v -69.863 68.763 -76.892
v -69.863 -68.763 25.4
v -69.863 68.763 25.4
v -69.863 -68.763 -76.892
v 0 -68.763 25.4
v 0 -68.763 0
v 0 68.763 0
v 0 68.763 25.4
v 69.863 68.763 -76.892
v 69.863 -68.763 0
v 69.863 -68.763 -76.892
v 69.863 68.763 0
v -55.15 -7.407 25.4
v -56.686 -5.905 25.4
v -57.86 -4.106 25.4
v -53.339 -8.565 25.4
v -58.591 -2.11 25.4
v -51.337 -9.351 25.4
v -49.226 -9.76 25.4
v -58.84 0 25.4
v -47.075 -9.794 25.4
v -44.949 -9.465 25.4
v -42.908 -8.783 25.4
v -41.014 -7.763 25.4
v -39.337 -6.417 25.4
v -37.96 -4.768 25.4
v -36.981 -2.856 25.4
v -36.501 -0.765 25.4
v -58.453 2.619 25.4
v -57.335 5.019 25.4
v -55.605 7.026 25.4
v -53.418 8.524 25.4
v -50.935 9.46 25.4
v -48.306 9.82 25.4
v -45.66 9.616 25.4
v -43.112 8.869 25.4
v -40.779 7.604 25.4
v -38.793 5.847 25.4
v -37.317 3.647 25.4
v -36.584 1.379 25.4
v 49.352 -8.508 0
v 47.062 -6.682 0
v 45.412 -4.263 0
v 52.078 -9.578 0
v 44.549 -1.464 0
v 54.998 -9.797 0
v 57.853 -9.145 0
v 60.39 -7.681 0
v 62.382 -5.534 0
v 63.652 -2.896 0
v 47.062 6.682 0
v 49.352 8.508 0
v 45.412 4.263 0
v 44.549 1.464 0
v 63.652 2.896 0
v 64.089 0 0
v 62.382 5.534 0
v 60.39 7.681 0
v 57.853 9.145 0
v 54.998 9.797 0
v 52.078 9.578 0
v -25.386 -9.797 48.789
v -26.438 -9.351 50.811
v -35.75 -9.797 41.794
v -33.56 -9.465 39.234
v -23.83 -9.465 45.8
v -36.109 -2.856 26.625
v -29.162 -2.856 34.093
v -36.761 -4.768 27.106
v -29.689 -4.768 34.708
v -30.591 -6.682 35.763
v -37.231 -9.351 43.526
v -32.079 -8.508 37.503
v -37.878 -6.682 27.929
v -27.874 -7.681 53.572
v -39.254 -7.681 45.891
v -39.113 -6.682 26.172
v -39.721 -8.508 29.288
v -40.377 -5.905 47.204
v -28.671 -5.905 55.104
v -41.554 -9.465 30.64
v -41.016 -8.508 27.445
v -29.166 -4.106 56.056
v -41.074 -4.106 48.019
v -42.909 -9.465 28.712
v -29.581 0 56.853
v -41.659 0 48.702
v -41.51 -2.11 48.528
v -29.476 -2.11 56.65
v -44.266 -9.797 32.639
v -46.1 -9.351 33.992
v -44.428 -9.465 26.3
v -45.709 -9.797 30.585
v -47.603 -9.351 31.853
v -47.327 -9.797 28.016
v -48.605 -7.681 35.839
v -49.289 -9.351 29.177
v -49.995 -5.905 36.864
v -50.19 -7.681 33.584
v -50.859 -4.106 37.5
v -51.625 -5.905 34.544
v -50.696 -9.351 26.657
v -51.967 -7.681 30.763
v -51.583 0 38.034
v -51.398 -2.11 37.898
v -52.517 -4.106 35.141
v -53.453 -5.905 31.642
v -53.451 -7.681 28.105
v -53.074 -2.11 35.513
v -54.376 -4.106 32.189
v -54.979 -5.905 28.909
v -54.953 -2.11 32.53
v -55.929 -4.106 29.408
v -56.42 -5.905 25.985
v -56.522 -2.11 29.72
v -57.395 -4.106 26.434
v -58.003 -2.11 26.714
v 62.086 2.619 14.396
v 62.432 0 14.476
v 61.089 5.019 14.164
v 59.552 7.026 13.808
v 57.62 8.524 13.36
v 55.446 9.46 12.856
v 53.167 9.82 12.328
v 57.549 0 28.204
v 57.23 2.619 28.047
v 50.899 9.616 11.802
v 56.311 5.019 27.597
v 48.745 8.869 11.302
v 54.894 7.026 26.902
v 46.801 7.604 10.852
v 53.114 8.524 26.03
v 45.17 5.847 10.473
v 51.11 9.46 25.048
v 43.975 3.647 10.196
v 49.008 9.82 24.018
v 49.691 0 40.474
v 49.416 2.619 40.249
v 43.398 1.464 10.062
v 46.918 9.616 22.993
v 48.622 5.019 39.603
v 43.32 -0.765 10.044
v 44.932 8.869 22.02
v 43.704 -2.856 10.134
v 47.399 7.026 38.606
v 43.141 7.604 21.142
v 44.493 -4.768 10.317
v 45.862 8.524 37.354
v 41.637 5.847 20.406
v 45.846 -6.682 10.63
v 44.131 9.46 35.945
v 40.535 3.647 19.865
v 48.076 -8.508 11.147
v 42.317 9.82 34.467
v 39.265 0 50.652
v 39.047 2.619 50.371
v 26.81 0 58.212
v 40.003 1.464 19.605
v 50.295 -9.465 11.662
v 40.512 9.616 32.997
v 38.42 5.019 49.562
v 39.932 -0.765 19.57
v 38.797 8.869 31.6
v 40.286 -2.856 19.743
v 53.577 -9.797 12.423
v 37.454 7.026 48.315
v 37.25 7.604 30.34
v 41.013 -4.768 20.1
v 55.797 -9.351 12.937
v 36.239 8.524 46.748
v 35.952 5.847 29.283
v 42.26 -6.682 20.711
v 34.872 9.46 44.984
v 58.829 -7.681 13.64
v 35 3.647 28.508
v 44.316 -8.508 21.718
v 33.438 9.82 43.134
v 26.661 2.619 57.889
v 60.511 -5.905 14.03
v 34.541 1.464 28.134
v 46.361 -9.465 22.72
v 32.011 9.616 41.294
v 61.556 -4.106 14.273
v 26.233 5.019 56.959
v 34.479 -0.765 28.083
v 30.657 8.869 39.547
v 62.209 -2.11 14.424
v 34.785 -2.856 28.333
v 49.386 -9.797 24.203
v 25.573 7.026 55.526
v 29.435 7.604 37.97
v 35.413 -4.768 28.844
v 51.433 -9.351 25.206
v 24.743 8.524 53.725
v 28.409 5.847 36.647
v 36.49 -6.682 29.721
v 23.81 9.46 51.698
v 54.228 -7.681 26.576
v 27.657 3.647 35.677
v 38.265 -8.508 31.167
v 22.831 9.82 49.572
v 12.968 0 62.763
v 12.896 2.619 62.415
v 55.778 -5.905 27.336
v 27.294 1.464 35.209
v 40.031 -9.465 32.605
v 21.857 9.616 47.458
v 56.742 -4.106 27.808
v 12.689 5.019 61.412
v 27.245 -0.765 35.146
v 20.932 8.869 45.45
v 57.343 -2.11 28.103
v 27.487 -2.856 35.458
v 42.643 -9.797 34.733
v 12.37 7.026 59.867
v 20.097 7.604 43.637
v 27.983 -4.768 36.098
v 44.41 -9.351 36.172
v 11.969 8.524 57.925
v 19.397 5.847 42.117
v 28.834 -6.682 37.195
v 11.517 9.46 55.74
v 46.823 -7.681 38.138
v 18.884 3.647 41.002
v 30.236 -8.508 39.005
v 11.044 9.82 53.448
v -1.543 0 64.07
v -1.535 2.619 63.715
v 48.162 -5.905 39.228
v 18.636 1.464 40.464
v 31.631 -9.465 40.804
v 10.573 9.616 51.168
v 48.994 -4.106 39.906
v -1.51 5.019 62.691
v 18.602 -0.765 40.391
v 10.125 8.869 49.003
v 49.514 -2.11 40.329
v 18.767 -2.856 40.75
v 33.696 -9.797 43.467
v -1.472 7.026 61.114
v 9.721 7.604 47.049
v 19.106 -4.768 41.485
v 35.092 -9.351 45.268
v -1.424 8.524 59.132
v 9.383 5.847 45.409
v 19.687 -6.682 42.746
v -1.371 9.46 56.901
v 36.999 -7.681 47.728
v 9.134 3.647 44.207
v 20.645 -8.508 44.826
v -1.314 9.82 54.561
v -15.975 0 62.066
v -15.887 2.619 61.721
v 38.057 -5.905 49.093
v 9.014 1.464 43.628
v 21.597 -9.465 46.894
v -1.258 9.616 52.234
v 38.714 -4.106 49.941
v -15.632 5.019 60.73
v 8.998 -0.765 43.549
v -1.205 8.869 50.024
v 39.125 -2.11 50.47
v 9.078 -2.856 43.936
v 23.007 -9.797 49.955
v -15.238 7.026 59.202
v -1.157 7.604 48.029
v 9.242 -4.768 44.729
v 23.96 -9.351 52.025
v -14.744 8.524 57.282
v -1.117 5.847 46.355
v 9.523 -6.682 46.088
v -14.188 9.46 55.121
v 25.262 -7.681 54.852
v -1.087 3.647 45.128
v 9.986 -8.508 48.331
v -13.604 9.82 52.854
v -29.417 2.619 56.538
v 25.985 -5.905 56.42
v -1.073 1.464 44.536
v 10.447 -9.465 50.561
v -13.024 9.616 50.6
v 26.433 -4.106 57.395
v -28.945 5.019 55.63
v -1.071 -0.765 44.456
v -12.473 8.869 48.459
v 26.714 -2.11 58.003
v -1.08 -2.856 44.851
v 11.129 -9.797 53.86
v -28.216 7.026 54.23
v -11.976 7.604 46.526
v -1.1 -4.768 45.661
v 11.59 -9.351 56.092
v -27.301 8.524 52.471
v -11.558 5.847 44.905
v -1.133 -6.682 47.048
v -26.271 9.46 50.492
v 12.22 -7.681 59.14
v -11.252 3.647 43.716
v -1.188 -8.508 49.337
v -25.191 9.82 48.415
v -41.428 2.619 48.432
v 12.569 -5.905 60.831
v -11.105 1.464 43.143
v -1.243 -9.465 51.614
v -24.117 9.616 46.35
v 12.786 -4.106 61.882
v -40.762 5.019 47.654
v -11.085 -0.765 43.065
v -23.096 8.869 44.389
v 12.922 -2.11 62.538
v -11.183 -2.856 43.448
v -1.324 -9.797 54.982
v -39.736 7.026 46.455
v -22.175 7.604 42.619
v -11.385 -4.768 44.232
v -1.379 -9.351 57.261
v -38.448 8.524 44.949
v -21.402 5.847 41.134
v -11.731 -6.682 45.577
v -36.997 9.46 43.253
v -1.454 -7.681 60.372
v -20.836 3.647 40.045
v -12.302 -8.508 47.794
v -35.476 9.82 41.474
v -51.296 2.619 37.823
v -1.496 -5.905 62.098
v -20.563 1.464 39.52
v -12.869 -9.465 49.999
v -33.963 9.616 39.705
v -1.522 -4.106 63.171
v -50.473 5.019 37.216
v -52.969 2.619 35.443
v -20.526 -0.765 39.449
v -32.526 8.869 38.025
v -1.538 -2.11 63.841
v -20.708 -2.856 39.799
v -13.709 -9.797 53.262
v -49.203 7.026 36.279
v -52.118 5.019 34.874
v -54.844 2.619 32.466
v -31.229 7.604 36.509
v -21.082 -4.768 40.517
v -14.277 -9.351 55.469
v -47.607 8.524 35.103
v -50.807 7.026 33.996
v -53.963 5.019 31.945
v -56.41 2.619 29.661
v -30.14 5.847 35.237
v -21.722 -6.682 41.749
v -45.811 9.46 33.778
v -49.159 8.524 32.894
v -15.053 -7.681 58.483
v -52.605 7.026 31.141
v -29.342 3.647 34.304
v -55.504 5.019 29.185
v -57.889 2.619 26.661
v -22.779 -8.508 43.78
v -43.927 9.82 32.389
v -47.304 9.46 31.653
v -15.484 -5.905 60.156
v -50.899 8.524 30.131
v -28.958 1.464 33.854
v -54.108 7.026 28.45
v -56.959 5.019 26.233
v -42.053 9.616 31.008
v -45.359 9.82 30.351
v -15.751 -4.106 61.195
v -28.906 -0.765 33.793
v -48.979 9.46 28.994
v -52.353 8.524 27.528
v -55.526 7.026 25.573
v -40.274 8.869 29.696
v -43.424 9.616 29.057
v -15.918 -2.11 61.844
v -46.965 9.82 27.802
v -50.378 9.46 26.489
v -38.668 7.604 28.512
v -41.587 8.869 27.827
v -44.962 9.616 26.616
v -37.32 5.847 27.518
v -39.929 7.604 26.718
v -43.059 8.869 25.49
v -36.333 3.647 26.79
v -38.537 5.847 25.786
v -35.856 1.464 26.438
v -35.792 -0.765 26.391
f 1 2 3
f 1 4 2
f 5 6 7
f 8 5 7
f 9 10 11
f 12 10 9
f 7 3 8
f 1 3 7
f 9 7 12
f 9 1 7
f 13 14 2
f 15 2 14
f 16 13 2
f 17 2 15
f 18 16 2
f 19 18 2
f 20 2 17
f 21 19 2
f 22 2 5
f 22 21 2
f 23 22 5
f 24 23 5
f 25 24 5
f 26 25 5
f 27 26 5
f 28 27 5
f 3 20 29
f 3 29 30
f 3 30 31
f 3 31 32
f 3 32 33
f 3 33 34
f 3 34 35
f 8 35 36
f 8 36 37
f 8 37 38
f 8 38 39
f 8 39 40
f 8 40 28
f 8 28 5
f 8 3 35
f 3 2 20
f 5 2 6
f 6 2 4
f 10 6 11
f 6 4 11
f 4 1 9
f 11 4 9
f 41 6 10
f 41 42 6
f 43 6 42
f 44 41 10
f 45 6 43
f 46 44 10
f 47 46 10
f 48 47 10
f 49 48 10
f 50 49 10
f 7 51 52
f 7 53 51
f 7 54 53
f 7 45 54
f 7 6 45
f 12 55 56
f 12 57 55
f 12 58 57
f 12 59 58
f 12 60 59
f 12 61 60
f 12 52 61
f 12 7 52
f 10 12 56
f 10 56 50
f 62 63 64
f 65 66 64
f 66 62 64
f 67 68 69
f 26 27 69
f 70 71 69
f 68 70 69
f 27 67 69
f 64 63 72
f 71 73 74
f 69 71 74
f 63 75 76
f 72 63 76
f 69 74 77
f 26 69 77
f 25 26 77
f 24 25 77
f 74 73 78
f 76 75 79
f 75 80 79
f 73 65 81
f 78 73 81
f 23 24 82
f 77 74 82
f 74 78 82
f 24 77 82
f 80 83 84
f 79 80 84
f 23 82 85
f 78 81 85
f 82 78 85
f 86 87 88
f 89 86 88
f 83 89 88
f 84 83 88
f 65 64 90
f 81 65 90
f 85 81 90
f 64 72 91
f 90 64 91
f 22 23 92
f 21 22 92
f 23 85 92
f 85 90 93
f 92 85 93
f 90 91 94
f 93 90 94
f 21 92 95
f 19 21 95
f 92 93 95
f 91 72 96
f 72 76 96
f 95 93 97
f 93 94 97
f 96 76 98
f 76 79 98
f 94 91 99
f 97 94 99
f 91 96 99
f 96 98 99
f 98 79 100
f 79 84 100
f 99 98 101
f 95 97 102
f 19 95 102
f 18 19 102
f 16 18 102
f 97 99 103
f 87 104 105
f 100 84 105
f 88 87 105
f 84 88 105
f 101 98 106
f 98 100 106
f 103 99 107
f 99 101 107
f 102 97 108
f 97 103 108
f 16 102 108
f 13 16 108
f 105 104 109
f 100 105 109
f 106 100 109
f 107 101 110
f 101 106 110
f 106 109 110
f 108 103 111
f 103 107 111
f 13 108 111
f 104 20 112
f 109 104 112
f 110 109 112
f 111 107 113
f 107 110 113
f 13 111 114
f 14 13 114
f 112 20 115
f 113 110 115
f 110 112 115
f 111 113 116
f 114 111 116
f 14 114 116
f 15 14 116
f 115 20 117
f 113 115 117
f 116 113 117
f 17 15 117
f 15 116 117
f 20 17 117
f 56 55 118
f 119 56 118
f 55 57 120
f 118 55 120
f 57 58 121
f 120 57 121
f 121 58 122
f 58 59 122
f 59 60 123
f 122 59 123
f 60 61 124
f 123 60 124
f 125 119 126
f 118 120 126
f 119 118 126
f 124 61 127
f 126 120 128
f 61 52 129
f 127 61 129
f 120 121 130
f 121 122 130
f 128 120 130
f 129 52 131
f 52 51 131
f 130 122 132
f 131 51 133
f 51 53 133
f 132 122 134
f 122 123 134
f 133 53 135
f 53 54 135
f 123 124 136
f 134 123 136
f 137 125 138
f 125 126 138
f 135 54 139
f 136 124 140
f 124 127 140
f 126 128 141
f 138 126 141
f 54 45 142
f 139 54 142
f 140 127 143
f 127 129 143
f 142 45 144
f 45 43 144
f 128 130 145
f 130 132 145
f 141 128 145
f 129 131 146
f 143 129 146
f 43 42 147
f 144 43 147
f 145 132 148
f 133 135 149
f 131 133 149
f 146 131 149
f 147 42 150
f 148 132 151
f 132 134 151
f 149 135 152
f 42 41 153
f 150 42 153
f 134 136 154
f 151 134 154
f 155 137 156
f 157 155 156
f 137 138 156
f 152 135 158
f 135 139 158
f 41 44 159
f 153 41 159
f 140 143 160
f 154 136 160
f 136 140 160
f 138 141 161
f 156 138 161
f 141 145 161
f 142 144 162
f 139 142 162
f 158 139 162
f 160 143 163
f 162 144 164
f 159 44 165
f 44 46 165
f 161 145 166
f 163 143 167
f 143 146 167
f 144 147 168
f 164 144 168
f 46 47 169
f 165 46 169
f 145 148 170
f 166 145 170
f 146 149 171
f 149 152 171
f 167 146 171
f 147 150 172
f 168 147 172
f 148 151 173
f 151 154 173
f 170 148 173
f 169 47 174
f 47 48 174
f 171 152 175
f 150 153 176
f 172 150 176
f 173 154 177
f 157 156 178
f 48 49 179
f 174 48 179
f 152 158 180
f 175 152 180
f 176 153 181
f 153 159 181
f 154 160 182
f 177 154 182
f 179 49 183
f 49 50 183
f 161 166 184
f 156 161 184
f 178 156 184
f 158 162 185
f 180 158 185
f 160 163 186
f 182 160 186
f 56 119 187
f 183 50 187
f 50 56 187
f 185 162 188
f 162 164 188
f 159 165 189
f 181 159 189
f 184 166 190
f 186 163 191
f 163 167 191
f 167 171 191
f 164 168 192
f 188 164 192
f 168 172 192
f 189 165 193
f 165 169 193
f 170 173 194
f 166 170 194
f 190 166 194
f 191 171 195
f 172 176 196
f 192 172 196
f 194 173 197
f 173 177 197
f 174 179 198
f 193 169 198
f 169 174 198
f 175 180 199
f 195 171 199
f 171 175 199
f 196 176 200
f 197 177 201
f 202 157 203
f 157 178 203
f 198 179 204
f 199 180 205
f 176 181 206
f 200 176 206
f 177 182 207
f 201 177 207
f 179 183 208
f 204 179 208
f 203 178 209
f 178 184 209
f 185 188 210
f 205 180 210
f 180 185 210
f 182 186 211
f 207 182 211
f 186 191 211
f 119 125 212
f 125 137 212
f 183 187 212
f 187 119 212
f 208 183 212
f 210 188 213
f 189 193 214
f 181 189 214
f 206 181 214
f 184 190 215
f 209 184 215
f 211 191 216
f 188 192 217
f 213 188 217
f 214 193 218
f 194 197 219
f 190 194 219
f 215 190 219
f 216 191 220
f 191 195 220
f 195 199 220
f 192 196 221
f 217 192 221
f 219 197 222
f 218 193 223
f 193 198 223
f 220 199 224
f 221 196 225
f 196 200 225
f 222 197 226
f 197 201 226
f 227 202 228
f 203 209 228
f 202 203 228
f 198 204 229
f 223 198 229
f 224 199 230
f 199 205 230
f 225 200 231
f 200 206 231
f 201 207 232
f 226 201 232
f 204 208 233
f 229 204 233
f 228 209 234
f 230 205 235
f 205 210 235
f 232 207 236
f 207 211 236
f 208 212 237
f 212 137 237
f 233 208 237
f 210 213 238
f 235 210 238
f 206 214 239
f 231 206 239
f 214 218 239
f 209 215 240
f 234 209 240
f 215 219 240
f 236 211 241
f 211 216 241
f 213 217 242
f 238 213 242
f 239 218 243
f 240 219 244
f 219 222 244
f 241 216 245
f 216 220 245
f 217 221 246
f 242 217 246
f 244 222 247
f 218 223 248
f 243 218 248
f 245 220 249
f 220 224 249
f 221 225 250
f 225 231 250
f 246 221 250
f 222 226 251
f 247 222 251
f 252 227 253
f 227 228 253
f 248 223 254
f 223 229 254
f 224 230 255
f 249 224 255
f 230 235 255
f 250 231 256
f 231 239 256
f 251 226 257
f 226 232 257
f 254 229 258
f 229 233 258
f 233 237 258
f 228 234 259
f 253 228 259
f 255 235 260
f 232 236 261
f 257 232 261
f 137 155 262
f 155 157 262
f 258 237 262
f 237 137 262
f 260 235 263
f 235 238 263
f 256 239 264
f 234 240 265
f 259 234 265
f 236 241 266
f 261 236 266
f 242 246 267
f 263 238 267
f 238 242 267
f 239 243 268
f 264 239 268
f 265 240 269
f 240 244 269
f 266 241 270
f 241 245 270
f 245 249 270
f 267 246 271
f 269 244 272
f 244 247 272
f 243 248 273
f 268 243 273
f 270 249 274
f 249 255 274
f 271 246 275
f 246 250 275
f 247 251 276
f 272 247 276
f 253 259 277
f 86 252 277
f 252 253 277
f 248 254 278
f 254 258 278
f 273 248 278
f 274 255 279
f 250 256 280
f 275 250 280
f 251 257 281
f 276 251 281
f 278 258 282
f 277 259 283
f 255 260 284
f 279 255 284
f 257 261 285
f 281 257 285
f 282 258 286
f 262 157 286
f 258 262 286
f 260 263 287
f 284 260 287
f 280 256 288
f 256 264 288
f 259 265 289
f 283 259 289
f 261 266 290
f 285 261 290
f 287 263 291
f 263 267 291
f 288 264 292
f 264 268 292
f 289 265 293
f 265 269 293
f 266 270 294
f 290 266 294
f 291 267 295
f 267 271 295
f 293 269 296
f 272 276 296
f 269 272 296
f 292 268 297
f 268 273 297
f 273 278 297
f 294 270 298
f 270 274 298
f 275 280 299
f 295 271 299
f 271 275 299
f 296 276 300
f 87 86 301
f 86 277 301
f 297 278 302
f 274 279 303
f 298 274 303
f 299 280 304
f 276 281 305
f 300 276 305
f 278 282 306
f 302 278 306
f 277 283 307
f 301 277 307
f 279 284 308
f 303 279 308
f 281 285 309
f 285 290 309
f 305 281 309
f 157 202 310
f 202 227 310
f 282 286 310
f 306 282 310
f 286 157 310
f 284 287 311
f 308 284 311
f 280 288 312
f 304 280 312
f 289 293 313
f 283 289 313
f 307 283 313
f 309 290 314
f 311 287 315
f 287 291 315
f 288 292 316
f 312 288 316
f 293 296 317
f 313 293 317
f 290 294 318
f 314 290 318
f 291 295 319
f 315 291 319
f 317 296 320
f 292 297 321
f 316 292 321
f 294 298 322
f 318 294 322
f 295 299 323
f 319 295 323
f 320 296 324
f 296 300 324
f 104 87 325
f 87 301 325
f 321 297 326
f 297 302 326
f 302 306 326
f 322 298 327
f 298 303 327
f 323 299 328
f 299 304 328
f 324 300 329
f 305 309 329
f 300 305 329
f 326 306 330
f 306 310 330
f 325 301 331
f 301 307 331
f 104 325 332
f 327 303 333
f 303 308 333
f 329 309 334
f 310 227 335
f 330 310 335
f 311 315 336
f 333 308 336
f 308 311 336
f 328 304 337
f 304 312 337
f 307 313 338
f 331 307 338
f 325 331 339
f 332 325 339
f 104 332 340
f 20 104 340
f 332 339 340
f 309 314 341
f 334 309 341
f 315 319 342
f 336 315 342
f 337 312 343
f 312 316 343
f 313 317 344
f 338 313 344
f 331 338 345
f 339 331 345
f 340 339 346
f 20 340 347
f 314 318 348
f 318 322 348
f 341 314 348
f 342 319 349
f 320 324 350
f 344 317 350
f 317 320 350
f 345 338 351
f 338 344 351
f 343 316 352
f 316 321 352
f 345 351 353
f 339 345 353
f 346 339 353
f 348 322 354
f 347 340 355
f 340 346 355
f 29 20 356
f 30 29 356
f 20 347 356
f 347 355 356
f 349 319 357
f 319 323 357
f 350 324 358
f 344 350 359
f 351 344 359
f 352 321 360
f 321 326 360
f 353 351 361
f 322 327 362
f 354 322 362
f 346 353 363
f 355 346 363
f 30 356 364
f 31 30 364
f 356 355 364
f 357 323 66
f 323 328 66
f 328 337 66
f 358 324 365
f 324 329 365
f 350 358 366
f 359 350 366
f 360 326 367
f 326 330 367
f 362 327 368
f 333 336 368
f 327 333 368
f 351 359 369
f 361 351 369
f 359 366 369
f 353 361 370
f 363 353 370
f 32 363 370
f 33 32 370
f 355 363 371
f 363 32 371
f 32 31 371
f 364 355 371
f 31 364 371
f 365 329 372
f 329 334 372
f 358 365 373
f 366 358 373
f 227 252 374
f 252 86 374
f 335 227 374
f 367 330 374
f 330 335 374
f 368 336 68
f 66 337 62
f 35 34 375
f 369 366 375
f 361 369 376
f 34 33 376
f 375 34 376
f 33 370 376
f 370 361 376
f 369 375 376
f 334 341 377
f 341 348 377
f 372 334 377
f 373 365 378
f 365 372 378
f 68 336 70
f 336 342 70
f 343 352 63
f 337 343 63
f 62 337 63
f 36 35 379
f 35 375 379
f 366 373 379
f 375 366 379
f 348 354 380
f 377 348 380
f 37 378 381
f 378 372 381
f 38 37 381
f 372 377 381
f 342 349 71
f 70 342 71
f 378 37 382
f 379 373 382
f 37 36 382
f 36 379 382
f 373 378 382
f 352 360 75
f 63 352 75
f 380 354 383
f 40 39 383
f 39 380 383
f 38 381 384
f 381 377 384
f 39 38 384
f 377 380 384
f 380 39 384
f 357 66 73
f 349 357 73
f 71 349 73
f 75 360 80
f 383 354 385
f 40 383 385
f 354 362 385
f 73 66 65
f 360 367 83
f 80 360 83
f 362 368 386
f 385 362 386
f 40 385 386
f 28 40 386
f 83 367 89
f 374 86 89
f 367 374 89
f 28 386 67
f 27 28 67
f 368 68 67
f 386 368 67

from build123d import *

# Parameters (mm, degrees)
F0_W      = 69.863096
F0_H      = 137.526572
F2_DEPTH  = 76.89179
F1_R      = 9.824635
F4_DEPTH  = 25.4
F4_FACE_W = 69.863096
F4_FACE_H = 137.526572
F5_DEPTH  = 25.4
F6_DEPTH  = 25.4


with BuildPart() as f2:
    # F0 (on Top) → F2 (new body)
    with BuildSketch(Plane.XY):
        with Locations((-34.931548, 0)):
            Rectangle(F0_W, F0_H)
        with Locations((34.931548, 0)):
            Rectangle(F0_W, F0_H)
    extrude(amount=-F2_DEPTH)

    # F1 (on Top) → F3 (revolve)
    with BuildSketch(Plane.XY):
        with Locations((54.264009, 0)):
            Circle(F1_R)
    revolve(axis=Axis((0, 0, 0), (0, -1, 0)))

    # F0 (on Top) → F4 (join)
    with BuildSketch(Plane.XY):
        with Locations((-34.931548, 0)):
            Rectangle(F0_W, F0_H)
    extrude(amount=F4_DEPTH)

    # F4_face (on face) → F5 (join)
    with BuildSketch(Plane(origin=(-34.455236, 0, 25.4), x_dir=(1, 0, 0), z_dir=(0, 0, 1))):
        with Locations((-0.476312, 0)):
            Rectangle(F4_FACE_W, F4_FACE_H)
        with BuildLine():
            add(Edge.make_bspline(
                [(-24.385178, 0), (-24.385178, 0.668247), (-24.32577, 1.336628), (-24.206912, 1.99823), (-24.030098, 2.646689), (-23.797825, 3.276099), (-23.37971, 4.166697), (-23.234065, 4.446908), (-23.077242, 4.721166), (-22.909651, 4.98898), (-22.731734, 5.249905), (-22.229971, 5.927648), (-21.88841, 6.331385), (-21.521456, 6.712873), (-21.131426, 7.070663), (-20.720671, 7.403639), (-19.847998, 8.028648), (-19.384812, 8.318937), (-18.904547, 8.580964), (-18.409705, 8.814186), (-17.902695, 9.018322), (-17.050434, 9.306791), (-16.710914, 9.40802), (-16.367843, 9.496945), (-16.02182, 9.573576), (-15.673419, 9.637946), (-14.585966, 9.79991), (-13.840719, 9.855608), (-13.09247, 9.857734), (-12.345999, 9.807078), (-11.605852, 9.704627), (-10.339404, 9.438416), (-9.80827, 9.297984), (-9.284679, 9.130358), (-8.770428, 8.935906), (-8.267378, 8.715014), (-7.592089, 8.374585), (-7.408591, 8.277395), (-7.227085, 8.176494), (-7.047683, 8.071901), (-6.870499, 7.963641), (-6.45624, 7.69851), (-6.221211, 7.538453), (-5.990868, 7.371624), (-5.765532, 7.198092), (-5.545543, 7.017935), (-5.03891, 6.576543), (-4.757184, 6.309683), (-4.486982, 6.030895), (-4.229294, 5.740472), (-3.985174, 5.4388), (-3.558839, 4.858328), (-3.372758, 4.582367), (-3.198165, 4.298826), (-3.035779, 4.008107), (-2.886315, 3.710707), (-2.67324, 3.234777), (-2.600421, 3.060357), (-2.532119, 2.88409), (-2.468453, 2.706097), (-2.409533, 2.526514), (-2.243048, 1.969131), (-2.15158, 1.586498), (-2.081997, 1.19897), (-2.03498, 0.808045), (-2.01092, 0.415339), (-2.008697, -0.377657), (-2.031422, -0.778015), (-2.078012, -1.17662), (-2.148069, -1.571759), (-2.240876, -1.961843), (-2.409505, -2.526425), (-2.46842, -2.706002), (-2.532082, -2.883988), (-2.600379, -3.060249), (-2.673192, -3.234663), (-2.88625, -3.710575), (-3.035702, -4.007963), (-3.198075, -4.298671), (-3.372655, -4.582202), (-3.55872, -4.858153), (-3.985022, -5.438608), (-4.229123, -5.740271), (-4.486791, -6.030687), (-4.756973, -6.30947), (-5.038678, -6.576325), (-5.545277, -7.017715), (-5.765253, -7.197872), (-5.990575, -7.371405), (-6.220906, -7.538235), (-6.455921, -7.698295), (-6.87016, -7.963432), (-7.047336, -8.071696), (-7.226731, -8.176292), (-7.40823, -8.277198), (-7.591721, -8.374391), (-8.266995, -8.714841), (-8.770037, -8.93575), (-9.284281, -9.130219), (-9.807866, -9.297862), (-10.338996, -9.438312), (-11.605451, -9.704568), (-12.345612, -9.807044), (-13.092098, -9.857724), (-13.840364, -9.85562), (-14.58563, -9.799941), (-15.673115, -9.638001), (-16.021528, -9.573637), (-16.367564, -9.497013), (-16.710646, -9.408093), (-17.050179, -9.306869), (-17.902472, -9.018411), (-18.4095, -8.814279), (-18.90436, -8.58106), (-19.384645, -8.319034), (-19.847849, -8.028745), (-20.720553, -7.403734), (-21.131321, -7.070757), (-21.521364, -6.712964), (-21.888331, -6.331472), (-22.229903, -5.927731), (-22.731682, -5.249979), (-22.909604, -4.989052), (-23.0772, -4.721236), (-23.234028, -4.446976), (-23.379677, -4.166762), (-23.797805, -3.276152), (-24.030086, -2.646733), (-24.206906, -1.998264), (-24.325768, -1.336651), (-24.385178, -0.668258), (-24.385178, 0)],
                knots=[0, 0, 0, 0, 0, 0, 0, 0.060752, 0.060752, 0.060752, 0.060752, 0.060752, 0.089435, 0.089435, 0.089435, 0.089435, 0.089435, 0.137395, 0.137395, 0.137395, 0.137395, 0.137395, 0.186967, 0.186967, 0.186967, 0.186967, 0.186967, 0.219128, 0.219128, 0.219128, 0.219128, 0.219128, 0.286825, 0.286825, 0.286825, 0.286825, 0.286825, 0.336655, 0.336655, 0.336655, 0.336655, 0.336655, 0.355511, 0.355511, 0.355511, 0.355511, 0.355511, 0.381329, 0.381329, 0.381329, 0.381329, 0.381329, 0.416554, 0.416554, 0.416554, 0.416554, 0.416554, 0.446776, 0.446776, 0.446776, 0.446776, 0.446776, 0.463951, 0.463951, 0.463951, 0.463951, 0.463951, 0.499657, 0.499657, 0.499657, 0.499657, 0.499657, 0.536048, 0.536048, 0.536048, 0.536048, 0.536048, 0.553222, 0.553222, 0.553222, 0.553222, 0.553222, 0.583442, 0.583442, 0.583442, 0.583442, 0.583442, 0.618665, 0.618665, 0.618665, 0.618665, 0.618665, 0.644483, 0.644483, 0.644483, 0.644483, 0.644483, 0.663338, 0.663338, 0.663338, 0.663338, 0.663338, 0.713168, 0.713168, 0.713168, 0.713168, 0.713168, 0.780867, 0.780867, 0.780867, 0.780867, 0.780867, 0.813029, 0.813029, 0.813029, 0.813029, 0.813029, 0.862602, 0.862602, 0.862602, 0.862602, 0.862602, 0.910564, 0.910564, 0.910564, 0.910564, 0.910564, 0.939247, 0.939247, 0.939247, 0.939247, 0.939247, 1, 1, 1, 1, 1, 1, 1], degree=6))
        make_face(mode=Mode.SUBTRACT)
    extrude(amount=-F5_DEPTH)

    # F4_face (on face) → F6 (join)
    with BuildSketch(Plane(origin=(-34.455236, 0, 25.4), x_dir=(1, 0, 0), z_dir=(0, 0, 1))):
        with Locations((-0.476312, 0)):
            Rectangle(F4_FACE_W, F4_FACE_H)
        with BuildLine():
            add(Edge.make_bspline(
                [(-24.385178, 0), (-24.385178, 0.668247), (-24.32577, 1.336628), (-24.206912, 1.99823), (-24.030098, 2.646689), (-23.797825, 3.276099), (-23.37971, 4.166697), (-23.234065, 4.446908), (-23.077242, 4.721166), (-22.909651, 4.98898), (-22.731734, 5.249905), (-22.229971, 5.927648), (-21.88841, 6.331385), (-21.521456, 6.712873), (-21.131426, 7.070663), (-20.720671, 7.403639), (-19.847998, 8.028648), (-19.384812, 8.318937), (-18.904547, 8.580964), (-18.409705, 8.814186), (-17.902695, 9.018322), (-17.050434, 9.306791), (-16.710914, 9.40802), (-16.367843, 9.496945), (-16.02182, 9.573576), (-15.673419, 9.637946), (-14.585966, 9.79991), (-13.840719, 9.855608), (-13.09247, 9.857734), (-12.345999, 9.807078), (-11.605852, 9.704627), (-10.339404, 9.438416), (-9.80827, 9.297984), (-9.284679, 9.130358), (-8.770428, 8.935906), (-8.267378, 8.715014), (-7.592089, 8.374585), (-7.408591, 8.277395), (-7.227085, 8.176494), (-7.047683, 8.071901), (-6.870499, 7.963641), (-6.45624, 7.69851), (-6.221211, 7.538453), (-5.990868, 7.371624), (-5.765532, 7.198092), (-5.545543, 7.017935), (-5.03891, 6.576543), (-4.757184, 6.309683), (-4.486982, 6.030895), (-4.229294, 5.740472), (-3.985174, 5.4388), (-3.558839, 4.858328), (-3.372758, 4.582367), (-3.198165, 4.298826), (-3.035779, 4.008107), (-2.886315, 3.710707), (-2.67324, 3.234777), (-2.600421, 3.060357), (-2.532119, 2.88409), (-2.468453, 2.706097), (-2.409533, 2.526514), (-2.243048, 1.969131), (-2.15158, 1.586498), (-2.081997, 1.19897), (-2.03498, 0.808045), (-2.01092, 0.415339), (-2.008697, -0.377657), (-2.031422, -0.778015), (-2.078012, -1.17662), (-2.148069, -1.571759), (-2.240876, -1.961843), (-2.409505, -2.526425), (-2.46842, -2.706002), (-2.532082, -2.883988), (-2.600379, -3.060249), (-2.673192, -3.234663), (-2.88625, -3.710575), (-3.035702, -4.007963), (-3.198075, -4.298671), (-3.372655, -4.582202), (-3.55872, -4.858153), (-3.985022, -5.438608), (-4.229123, -5.740271), (-4.486791, -6.030687), (-4.756973, -6.30947), (-5.038678, -6.576325), (-5.545277, -7.017715), (-5.765253, -7.197872), (-5.990575, -7.371405), (-6.220906, -7.538235), (-6.455921, -7.698295), (-6.87016, -7.963432), (-7.047336, -8.071696), (-7.226731, -8.176292), (-7.40823, -8.277198), (-7.591721, -8.374391), (-8.266995, -8.714841), (-8.770037, -8.93575), (-9.284281, -9.130219), (-9.807866, -9.297862), (-10.338996, -9.438312), (-11.605451, -9.704568), (-12.345612, -9.807044), (-13.092098, -9.857724), (-13.840364, -9.85562), (-14.58563, -9.799941), (-15.673115, -9.638001), (-16.021528, -9.573637), (-16.367564, -9.497013), (-16.710646, -9.408093), (-17.050179, -9.306869), (-17.902472, -9.018411), (-18.4095, -8.814279), (-18.90436, -8.58106), (-19.384645, -8.319034), (-19.847849, -8.028745), (-20.720553, -7.403734), (-21.131321, -7.070757), (-21.521364, -6.712964), (-21.888331, -6.331472), (-22.229903, -5.927731), (-22.731682, -5.249979), (-22.909604, -4.989052), (-23.0772, -4.721236), (-23.234028, -4.446976), (-23.379677, -4.166762), (-23.797805, -3.276152), (-24.030086, -2.646733), (-24.206906, -1.998264), (-24.325768, -1.336651), (-24.385178, -0.668258), (-24.385178, 0)],
                knots=[0, 0, 0, 0, 0, 0, 0, 0.060752, 0.060752, 0.060752, 0.060752, 0.060752, 0.089435, 0.089435, 0.089435, 0.089435, 0.089435, 0.137395, 0.137395, 0.137395, 0.137395, 0.137395, 0.186967, 0.186967, 0.186967, 0.186967, 0.186967, 0.219128, 0.219128, 0.219128, 0.219128, 0.219128, 0.286825, 0.286825, 0.286825, 0.286825, 0.286825, 0.336655, 0.336655, 0.336655, 0.336655, 0.336655, 0.355511, 0.355511, 0.355511, 0.355511, 0.355511, 0.381329, 0.381329, 0.381329, 0.381329, 0.381329, 0.416554, 0.416554, 0.416554, 0.416554, 0.416554, 0.446776, 0.446776, 0.446776, 0.446776, 0.446776, 0.463951, 0.463951, 0.463951, 0.463951, 0.463951, 0.499657, 0.499657, 0.499657, 0.499657, 0.499657, 0.536048, 0.536048, 0.536048, 0.536048, 0.536048, 0.553222, 0.553222, 0.553222, 0.553222, 0.553222, 0.583442, 0.583442, 0.583442, 0.583442, 0.583442, 0.618665, 0.618665, 0.618665, 0.618665, 0.618665, 0.644483, 0.644483, 0.644483, 0.644483, 0.644483, 0.663338, 0.663338, 0.663338, 0.663338, 0.663338, 0.713168, 0.713168, 0.713168, 0.713168, 0.713168, 0.780867, 0.780867, 0.780867, 0.780867, 0.780867, 0.813029, 0.813029, 0.813029, 0.813029, 0.813029, 0.862602, 0.862602, 0.862602, 0.862602, 0.862602, 0.910564, 0.910564, 0.910564, 0.910564, 0.910564, 0.939247, 0.939247, 0.939247, 0.939247, 0.939247, 1, 1, 1, 1, 1, 1, 1], degree=6))
        make_face(mode=Mode.SUBTRACT)
    extrude(amount=-F6_DEPTH)


solid = f2.part
